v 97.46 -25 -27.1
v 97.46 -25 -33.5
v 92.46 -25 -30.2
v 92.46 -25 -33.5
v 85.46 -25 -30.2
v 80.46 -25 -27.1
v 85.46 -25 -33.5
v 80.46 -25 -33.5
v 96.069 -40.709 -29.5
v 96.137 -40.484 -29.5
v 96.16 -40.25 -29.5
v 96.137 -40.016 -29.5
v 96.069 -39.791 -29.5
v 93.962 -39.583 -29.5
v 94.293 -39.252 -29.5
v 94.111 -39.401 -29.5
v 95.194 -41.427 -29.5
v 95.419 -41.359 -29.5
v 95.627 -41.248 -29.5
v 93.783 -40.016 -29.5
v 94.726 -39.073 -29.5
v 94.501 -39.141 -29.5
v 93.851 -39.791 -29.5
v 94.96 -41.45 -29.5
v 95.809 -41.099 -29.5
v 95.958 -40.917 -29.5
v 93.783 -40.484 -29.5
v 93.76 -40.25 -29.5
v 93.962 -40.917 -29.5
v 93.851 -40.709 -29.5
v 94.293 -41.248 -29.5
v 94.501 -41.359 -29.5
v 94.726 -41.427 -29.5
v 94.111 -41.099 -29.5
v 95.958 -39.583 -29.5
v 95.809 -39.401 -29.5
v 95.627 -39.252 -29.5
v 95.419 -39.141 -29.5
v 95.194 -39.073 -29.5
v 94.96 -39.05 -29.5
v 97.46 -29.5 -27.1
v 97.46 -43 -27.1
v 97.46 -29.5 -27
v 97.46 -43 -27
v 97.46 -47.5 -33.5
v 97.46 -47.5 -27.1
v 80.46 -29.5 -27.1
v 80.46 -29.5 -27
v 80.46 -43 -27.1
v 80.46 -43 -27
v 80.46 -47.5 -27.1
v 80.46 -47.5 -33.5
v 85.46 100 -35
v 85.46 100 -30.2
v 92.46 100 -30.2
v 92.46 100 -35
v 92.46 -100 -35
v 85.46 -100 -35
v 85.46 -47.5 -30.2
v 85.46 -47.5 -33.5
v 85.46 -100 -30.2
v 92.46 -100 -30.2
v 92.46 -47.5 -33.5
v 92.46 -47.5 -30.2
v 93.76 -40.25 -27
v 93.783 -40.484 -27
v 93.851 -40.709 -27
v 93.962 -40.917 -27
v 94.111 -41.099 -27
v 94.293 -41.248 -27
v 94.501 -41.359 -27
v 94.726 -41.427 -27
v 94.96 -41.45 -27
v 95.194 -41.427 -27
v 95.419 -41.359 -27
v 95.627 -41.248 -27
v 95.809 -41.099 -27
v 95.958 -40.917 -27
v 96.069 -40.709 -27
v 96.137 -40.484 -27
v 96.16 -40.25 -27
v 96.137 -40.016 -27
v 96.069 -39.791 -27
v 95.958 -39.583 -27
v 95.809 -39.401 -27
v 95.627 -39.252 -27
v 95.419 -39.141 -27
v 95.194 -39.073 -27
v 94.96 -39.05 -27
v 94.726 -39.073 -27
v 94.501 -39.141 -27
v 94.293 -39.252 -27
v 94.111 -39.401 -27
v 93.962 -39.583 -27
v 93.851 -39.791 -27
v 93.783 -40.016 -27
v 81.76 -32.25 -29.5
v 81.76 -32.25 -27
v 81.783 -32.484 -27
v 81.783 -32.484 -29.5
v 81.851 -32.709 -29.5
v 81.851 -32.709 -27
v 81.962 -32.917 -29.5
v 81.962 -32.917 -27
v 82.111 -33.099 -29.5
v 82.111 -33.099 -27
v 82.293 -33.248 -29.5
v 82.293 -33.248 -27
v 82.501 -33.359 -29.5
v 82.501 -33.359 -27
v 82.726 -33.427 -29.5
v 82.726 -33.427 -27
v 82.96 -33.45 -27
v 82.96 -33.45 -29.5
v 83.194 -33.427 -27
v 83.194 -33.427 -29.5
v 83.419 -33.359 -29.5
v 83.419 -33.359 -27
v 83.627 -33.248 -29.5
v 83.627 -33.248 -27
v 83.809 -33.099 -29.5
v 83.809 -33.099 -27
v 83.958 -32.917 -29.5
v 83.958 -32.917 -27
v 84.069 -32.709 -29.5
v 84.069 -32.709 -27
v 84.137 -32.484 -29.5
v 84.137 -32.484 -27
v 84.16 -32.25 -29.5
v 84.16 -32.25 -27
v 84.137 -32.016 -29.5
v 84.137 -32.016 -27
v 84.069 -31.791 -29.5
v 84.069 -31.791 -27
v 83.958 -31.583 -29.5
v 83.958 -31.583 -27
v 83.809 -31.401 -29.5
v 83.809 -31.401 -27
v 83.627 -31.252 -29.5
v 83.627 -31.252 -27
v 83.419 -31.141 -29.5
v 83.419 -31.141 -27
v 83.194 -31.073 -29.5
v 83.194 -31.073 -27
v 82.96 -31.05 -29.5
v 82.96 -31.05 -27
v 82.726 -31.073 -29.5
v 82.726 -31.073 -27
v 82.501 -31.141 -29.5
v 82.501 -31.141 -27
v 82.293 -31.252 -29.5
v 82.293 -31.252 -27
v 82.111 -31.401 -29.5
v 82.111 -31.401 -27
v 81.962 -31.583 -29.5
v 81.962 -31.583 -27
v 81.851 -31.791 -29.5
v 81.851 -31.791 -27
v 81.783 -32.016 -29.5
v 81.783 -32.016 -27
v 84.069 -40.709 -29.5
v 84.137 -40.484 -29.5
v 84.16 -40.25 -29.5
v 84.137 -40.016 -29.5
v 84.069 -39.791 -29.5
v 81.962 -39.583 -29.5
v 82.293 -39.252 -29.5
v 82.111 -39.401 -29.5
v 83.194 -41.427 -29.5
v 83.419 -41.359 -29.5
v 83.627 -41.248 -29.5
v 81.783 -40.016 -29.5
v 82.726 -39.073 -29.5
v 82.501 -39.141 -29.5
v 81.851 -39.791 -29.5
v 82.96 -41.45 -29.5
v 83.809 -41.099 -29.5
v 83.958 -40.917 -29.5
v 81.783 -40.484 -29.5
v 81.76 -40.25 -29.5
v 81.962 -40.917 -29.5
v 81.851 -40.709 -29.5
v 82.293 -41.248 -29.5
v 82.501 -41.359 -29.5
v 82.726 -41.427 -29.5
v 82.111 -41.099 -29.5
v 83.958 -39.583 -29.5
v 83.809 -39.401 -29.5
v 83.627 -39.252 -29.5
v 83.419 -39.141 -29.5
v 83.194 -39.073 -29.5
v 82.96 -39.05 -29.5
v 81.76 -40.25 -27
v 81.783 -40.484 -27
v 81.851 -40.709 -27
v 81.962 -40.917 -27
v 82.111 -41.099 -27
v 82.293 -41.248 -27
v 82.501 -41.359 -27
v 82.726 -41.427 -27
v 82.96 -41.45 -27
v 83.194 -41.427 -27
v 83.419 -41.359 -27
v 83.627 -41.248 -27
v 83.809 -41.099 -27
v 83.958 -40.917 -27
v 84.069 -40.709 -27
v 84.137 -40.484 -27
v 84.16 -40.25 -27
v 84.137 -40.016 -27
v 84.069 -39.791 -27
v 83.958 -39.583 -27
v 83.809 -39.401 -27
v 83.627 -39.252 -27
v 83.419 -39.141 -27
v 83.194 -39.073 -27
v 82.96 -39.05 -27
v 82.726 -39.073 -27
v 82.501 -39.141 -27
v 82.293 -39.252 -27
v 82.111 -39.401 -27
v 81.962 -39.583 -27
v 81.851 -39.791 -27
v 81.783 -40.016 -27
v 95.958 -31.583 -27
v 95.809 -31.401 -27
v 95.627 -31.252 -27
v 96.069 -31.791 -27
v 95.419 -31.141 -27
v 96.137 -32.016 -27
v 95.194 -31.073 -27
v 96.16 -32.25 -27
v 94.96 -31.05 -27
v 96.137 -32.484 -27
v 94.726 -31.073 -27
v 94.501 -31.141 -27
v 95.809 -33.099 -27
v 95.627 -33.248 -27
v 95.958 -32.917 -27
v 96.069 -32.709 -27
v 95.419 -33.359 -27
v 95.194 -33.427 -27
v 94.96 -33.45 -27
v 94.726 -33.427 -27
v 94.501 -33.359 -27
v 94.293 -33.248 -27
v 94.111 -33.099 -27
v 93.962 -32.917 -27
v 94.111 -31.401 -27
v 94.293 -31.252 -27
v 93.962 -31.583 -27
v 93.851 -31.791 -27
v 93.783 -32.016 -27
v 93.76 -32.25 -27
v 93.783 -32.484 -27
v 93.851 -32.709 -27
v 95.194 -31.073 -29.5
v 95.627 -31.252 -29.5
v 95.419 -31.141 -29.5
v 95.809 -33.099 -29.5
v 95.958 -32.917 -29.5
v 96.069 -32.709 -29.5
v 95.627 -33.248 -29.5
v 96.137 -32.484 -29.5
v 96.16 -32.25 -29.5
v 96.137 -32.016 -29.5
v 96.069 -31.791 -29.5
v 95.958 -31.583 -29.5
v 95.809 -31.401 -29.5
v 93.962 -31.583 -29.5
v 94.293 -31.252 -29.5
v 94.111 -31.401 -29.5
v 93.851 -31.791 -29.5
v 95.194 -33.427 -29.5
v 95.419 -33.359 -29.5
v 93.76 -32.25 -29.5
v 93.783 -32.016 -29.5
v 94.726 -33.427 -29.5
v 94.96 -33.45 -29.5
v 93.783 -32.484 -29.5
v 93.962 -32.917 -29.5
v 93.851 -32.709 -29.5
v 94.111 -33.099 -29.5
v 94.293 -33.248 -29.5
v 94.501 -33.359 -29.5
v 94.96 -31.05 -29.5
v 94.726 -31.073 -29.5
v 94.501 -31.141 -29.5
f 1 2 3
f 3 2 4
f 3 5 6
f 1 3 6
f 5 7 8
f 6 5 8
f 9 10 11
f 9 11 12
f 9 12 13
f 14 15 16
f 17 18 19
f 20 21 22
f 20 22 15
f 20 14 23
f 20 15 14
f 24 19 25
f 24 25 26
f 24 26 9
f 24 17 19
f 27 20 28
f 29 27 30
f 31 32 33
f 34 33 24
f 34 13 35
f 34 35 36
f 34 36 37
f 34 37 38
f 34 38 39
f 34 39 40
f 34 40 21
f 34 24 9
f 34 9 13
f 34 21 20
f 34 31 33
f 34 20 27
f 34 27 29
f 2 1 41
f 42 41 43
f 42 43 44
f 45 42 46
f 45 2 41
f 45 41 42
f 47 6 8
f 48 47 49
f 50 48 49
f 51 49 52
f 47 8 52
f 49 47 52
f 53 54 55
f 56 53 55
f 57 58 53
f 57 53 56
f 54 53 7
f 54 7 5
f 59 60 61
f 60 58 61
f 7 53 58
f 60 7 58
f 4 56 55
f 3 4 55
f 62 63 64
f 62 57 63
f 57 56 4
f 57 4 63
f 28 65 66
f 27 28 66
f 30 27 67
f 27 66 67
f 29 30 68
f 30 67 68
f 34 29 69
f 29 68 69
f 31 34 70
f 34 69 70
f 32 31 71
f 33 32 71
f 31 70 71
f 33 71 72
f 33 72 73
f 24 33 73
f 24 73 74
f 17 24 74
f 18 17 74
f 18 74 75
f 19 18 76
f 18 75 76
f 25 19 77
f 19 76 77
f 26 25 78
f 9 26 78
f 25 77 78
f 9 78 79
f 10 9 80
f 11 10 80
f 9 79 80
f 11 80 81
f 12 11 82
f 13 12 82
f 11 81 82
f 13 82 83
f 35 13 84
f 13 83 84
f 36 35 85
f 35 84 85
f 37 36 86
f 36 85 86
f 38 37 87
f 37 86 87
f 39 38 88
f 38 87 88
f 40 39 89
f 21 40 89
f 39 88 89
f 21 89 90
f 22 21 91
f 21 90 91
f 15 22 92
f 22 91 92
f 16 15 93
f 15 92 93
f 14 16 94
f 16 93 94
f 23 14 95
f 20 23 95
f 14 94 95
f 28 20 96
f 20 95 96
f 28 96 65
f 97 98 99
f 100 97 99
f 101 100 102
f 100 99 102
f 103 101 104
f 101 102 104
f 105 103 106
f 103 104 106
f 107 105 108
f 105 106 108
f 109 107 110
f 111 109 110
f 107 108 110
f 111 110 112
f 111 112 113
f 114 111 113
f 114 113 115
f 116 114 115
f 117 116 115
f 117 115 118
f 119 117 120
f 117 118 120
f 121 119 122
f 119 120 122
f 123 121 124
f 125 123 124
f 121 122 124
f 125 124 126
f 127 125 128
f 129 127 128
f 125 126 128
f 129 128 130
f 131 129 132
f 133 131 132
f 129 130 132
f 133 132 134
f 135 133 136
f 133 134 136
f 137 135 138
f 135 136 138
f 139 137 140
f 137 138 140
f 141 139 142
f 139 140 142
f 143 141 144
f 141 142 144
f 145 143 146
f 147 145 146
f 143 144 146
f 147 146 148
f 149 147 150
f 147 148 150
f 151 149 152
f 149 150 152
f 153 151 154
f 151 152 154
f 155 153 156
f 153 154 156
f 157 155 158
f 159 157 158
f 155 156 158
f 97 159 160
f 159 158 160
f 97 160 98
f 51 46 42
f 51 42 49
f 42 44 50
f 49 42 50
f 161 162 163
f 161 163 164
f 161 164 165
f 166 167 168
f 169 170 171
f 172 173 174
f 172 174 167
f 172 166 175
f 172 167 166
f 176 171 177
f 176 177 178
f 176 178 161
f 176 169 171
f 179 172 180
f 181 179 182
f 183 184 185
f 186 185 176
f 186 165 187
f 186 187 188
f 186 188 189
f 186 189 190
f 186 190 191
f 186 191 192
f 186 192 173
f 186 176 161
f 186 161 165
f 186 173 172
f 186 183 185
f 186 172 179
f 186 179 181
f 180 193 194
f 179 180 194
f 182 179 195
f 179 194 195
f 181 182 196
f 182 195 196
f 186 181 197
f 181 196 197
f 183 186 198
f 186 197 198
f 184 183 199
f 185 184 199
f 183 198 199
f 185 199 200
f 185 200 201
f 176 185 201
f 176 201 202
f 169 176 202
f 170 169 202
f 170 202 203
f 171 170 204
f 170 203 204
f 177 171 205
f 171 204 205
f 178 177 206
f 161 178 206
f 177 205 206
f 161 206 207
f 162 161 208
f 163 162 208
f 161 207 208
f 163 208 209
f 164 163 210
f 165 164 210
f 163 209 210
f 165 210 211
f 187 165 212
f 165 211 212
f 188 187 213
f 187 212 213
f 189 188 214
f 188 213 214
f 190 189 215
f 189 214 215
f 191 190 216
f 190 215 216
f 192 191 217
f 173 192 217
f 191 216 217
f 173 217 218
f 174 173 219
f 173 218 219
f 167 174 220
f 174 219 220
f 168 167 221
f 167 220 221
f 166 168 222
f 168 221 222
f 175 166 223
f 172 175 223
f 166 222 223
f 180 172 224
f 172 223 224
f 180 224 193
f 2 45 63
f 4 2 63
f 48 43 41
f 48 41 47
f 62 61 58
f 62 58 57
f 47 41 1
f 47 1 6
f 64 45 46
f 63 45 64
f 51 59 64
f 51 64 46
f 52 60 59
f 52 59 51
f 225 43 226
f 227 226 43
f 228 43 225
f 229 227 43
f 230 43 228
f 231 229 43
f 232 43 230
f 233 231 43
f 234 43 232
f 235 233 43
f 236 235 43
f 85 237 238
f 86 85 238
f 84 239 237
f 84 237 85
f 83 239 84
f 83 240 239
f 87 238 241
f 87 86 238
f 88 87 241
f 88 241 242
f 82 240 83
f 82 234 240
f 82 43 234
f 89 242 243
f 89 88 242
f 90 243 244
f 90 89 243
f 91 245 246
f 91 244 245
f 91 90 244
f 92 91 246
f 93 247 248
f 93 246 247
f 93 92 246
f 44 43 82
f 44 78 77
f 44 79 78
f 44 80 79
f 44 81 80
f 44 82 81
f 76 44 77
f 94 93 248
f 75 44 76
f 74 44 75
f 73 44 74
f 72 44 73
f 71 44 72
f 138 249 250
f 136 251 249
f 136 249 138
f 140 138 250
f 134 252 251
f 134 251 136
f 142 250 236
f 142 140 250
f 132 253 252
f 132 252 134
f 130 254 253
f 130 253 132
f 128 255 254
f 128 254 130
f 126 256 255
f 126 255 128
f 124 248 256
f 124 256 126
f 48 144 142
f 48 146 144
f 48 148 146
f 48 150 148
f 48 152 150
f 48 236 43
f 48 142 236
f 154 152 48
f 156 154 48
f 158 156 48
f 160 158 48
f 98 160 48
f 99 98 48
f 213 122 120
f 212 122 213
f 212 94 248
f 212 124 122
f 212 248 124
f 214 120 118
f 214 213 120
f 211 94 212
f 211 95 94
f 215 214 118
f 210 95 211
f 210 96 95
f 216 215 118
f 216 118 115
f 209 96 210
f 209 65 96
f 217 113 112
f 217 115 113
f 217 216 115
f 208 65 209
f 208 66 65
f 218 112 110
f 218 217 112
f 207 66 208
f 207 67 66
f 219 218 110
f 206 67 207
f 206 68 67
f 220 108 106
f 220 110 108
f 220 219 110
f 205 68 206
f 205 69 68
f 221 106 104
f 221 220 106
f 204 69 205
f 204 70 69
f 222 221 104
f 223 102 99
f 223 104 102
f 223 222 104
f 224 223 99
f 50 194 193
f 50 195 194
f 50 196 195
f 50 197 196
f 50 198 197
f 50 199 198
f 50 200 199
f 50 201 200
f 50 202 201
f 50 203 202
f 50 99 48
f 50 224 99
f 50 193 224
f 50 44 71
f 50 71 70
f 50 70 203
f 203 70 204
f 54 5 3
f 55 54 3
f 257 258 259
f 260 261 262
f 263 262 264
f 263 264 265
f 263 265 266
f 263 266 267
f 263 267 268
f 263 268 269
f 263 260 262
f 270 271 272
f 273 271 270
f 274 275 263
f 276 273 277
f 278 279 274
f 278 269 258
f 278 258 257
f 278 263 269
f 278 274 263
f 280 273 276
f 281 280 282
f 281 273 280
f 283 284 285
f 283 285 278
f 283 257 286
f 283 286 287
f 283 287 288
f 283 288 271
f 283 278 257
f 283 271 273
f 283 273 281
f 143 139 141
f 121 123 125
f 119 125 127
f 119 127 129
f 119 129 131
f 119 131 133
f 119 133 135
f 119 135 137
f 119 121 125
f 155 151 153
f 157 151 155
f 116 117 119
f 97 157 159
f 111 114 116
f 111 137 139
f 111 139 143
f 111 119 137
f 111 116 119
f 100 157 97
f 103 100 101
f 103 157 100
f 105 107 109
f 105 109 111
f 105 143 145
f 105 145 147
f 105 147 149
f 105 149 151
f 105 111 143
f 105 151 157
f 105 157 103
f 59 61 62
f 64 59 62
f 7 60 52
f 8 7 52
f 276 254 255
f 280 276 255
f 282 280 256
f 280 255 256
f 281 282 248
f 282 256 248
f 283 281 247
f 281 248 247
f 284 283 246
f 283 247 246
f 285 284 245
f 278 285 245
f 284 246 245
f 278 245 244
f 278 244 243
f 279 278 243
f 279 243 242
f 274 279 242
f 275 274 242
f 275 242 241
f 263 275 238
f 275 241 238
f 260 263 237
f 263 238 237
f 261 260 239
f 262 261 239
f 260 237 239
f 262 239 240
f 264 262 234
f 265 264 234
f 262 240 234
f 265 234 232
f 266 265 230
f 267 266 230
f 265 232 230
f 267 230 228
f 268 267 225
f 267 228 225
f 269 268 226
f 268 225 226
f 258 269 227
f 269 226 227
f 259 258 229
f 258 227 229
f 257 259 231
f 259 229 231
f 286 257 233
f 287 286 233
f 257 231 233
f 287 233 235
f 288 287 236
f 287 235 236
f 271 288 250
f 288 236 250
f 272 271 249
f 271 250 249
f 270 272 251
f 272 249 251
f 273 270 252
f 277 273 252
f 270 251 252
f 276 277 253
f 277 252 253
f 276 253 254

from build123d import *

# Parameters (mm, degrees)
SKETCH022_W     = 7
SKETCH022_H     = 4.8
PAD008_DEPTH    = 200
SKETCH023_W     = 17
SKETCH023_H     = 22.5
PAD009_DEPTH    = 6.5
SKETCH025_W     = 17
SKETCH025_H     = 4.5
POCKET014_DEPTH = 0.1
SKETCH024_R     = 1.2
POCKET015_DEPTH = 2.5


with BuildPart() as part:
    # Sketch022 → Pad008 (new body)
    with BuildSketch(Plane.XZ):
        with Locations((3.5, 2.4)):
            Rectangle(SKETCH022_W, SKETCH022_H)
    extrude(amount=-PAD008_DEPTH)

    # Sketch023 (on Face1 of Pad008) → Pad009 (join)
    with BuildSketch(Plane(origin=(0, 0, 1.5), x_dir=(-1, 0, 0), z_dir=(0, 0, 1))):
        with Locations((-3.5, -63.75)):
            Rectangle(SKETCH023_W, SKETCH023_H)
    extrude(amount=PAD009_DEPTH)

    # Sketch025 (on Face13 of Pad009) → Pocket014 (cut)
    with BuildSketch(Plane(origin=(0, 0, 8), x_dir=(-1, 0, 0), z_dir=(0, 0, 1))):
        with Locations((-3.5, -54.75)):
            Rectangle(SKETCH025_W, SKETCH025_H)
        with Locations((-3.5, -72.75)):
            Rectangle(SKETCH025_W, SKETCH025_H)
    extrude(amount=-POCKET014_DEPTH, mode=Mode.SUBTRACT)

    # Sketch024 (on Face17 of Pocket014) → Pocket015 (cut)
    with BuildSketch(Plane(origin=(0, 0, 8), x_dir=(-1, 0, 0), z_dir=(0, 0, 1))):
        with Locations((-9.5, -59.75)):
            Circle(SKETCH024_R)
        with Locations((2.5, -59.75)):
            Circle(SKETCH024_R)
        with Locations((2.5, -67.75)):
            Circle(SKETCH024_R)
        with Locations((-9.5, -67.75)):
            Circle(SKETCH024_R)
    extrude(amount=-POCKET015_DEPTH, mode=Mode.SUBTRACT)


with BuildPart() as part_1:
    # Body005 placement: moved
    add(part.part.moved(Location((85.46, -100, -35))))


solid = part_1.part
